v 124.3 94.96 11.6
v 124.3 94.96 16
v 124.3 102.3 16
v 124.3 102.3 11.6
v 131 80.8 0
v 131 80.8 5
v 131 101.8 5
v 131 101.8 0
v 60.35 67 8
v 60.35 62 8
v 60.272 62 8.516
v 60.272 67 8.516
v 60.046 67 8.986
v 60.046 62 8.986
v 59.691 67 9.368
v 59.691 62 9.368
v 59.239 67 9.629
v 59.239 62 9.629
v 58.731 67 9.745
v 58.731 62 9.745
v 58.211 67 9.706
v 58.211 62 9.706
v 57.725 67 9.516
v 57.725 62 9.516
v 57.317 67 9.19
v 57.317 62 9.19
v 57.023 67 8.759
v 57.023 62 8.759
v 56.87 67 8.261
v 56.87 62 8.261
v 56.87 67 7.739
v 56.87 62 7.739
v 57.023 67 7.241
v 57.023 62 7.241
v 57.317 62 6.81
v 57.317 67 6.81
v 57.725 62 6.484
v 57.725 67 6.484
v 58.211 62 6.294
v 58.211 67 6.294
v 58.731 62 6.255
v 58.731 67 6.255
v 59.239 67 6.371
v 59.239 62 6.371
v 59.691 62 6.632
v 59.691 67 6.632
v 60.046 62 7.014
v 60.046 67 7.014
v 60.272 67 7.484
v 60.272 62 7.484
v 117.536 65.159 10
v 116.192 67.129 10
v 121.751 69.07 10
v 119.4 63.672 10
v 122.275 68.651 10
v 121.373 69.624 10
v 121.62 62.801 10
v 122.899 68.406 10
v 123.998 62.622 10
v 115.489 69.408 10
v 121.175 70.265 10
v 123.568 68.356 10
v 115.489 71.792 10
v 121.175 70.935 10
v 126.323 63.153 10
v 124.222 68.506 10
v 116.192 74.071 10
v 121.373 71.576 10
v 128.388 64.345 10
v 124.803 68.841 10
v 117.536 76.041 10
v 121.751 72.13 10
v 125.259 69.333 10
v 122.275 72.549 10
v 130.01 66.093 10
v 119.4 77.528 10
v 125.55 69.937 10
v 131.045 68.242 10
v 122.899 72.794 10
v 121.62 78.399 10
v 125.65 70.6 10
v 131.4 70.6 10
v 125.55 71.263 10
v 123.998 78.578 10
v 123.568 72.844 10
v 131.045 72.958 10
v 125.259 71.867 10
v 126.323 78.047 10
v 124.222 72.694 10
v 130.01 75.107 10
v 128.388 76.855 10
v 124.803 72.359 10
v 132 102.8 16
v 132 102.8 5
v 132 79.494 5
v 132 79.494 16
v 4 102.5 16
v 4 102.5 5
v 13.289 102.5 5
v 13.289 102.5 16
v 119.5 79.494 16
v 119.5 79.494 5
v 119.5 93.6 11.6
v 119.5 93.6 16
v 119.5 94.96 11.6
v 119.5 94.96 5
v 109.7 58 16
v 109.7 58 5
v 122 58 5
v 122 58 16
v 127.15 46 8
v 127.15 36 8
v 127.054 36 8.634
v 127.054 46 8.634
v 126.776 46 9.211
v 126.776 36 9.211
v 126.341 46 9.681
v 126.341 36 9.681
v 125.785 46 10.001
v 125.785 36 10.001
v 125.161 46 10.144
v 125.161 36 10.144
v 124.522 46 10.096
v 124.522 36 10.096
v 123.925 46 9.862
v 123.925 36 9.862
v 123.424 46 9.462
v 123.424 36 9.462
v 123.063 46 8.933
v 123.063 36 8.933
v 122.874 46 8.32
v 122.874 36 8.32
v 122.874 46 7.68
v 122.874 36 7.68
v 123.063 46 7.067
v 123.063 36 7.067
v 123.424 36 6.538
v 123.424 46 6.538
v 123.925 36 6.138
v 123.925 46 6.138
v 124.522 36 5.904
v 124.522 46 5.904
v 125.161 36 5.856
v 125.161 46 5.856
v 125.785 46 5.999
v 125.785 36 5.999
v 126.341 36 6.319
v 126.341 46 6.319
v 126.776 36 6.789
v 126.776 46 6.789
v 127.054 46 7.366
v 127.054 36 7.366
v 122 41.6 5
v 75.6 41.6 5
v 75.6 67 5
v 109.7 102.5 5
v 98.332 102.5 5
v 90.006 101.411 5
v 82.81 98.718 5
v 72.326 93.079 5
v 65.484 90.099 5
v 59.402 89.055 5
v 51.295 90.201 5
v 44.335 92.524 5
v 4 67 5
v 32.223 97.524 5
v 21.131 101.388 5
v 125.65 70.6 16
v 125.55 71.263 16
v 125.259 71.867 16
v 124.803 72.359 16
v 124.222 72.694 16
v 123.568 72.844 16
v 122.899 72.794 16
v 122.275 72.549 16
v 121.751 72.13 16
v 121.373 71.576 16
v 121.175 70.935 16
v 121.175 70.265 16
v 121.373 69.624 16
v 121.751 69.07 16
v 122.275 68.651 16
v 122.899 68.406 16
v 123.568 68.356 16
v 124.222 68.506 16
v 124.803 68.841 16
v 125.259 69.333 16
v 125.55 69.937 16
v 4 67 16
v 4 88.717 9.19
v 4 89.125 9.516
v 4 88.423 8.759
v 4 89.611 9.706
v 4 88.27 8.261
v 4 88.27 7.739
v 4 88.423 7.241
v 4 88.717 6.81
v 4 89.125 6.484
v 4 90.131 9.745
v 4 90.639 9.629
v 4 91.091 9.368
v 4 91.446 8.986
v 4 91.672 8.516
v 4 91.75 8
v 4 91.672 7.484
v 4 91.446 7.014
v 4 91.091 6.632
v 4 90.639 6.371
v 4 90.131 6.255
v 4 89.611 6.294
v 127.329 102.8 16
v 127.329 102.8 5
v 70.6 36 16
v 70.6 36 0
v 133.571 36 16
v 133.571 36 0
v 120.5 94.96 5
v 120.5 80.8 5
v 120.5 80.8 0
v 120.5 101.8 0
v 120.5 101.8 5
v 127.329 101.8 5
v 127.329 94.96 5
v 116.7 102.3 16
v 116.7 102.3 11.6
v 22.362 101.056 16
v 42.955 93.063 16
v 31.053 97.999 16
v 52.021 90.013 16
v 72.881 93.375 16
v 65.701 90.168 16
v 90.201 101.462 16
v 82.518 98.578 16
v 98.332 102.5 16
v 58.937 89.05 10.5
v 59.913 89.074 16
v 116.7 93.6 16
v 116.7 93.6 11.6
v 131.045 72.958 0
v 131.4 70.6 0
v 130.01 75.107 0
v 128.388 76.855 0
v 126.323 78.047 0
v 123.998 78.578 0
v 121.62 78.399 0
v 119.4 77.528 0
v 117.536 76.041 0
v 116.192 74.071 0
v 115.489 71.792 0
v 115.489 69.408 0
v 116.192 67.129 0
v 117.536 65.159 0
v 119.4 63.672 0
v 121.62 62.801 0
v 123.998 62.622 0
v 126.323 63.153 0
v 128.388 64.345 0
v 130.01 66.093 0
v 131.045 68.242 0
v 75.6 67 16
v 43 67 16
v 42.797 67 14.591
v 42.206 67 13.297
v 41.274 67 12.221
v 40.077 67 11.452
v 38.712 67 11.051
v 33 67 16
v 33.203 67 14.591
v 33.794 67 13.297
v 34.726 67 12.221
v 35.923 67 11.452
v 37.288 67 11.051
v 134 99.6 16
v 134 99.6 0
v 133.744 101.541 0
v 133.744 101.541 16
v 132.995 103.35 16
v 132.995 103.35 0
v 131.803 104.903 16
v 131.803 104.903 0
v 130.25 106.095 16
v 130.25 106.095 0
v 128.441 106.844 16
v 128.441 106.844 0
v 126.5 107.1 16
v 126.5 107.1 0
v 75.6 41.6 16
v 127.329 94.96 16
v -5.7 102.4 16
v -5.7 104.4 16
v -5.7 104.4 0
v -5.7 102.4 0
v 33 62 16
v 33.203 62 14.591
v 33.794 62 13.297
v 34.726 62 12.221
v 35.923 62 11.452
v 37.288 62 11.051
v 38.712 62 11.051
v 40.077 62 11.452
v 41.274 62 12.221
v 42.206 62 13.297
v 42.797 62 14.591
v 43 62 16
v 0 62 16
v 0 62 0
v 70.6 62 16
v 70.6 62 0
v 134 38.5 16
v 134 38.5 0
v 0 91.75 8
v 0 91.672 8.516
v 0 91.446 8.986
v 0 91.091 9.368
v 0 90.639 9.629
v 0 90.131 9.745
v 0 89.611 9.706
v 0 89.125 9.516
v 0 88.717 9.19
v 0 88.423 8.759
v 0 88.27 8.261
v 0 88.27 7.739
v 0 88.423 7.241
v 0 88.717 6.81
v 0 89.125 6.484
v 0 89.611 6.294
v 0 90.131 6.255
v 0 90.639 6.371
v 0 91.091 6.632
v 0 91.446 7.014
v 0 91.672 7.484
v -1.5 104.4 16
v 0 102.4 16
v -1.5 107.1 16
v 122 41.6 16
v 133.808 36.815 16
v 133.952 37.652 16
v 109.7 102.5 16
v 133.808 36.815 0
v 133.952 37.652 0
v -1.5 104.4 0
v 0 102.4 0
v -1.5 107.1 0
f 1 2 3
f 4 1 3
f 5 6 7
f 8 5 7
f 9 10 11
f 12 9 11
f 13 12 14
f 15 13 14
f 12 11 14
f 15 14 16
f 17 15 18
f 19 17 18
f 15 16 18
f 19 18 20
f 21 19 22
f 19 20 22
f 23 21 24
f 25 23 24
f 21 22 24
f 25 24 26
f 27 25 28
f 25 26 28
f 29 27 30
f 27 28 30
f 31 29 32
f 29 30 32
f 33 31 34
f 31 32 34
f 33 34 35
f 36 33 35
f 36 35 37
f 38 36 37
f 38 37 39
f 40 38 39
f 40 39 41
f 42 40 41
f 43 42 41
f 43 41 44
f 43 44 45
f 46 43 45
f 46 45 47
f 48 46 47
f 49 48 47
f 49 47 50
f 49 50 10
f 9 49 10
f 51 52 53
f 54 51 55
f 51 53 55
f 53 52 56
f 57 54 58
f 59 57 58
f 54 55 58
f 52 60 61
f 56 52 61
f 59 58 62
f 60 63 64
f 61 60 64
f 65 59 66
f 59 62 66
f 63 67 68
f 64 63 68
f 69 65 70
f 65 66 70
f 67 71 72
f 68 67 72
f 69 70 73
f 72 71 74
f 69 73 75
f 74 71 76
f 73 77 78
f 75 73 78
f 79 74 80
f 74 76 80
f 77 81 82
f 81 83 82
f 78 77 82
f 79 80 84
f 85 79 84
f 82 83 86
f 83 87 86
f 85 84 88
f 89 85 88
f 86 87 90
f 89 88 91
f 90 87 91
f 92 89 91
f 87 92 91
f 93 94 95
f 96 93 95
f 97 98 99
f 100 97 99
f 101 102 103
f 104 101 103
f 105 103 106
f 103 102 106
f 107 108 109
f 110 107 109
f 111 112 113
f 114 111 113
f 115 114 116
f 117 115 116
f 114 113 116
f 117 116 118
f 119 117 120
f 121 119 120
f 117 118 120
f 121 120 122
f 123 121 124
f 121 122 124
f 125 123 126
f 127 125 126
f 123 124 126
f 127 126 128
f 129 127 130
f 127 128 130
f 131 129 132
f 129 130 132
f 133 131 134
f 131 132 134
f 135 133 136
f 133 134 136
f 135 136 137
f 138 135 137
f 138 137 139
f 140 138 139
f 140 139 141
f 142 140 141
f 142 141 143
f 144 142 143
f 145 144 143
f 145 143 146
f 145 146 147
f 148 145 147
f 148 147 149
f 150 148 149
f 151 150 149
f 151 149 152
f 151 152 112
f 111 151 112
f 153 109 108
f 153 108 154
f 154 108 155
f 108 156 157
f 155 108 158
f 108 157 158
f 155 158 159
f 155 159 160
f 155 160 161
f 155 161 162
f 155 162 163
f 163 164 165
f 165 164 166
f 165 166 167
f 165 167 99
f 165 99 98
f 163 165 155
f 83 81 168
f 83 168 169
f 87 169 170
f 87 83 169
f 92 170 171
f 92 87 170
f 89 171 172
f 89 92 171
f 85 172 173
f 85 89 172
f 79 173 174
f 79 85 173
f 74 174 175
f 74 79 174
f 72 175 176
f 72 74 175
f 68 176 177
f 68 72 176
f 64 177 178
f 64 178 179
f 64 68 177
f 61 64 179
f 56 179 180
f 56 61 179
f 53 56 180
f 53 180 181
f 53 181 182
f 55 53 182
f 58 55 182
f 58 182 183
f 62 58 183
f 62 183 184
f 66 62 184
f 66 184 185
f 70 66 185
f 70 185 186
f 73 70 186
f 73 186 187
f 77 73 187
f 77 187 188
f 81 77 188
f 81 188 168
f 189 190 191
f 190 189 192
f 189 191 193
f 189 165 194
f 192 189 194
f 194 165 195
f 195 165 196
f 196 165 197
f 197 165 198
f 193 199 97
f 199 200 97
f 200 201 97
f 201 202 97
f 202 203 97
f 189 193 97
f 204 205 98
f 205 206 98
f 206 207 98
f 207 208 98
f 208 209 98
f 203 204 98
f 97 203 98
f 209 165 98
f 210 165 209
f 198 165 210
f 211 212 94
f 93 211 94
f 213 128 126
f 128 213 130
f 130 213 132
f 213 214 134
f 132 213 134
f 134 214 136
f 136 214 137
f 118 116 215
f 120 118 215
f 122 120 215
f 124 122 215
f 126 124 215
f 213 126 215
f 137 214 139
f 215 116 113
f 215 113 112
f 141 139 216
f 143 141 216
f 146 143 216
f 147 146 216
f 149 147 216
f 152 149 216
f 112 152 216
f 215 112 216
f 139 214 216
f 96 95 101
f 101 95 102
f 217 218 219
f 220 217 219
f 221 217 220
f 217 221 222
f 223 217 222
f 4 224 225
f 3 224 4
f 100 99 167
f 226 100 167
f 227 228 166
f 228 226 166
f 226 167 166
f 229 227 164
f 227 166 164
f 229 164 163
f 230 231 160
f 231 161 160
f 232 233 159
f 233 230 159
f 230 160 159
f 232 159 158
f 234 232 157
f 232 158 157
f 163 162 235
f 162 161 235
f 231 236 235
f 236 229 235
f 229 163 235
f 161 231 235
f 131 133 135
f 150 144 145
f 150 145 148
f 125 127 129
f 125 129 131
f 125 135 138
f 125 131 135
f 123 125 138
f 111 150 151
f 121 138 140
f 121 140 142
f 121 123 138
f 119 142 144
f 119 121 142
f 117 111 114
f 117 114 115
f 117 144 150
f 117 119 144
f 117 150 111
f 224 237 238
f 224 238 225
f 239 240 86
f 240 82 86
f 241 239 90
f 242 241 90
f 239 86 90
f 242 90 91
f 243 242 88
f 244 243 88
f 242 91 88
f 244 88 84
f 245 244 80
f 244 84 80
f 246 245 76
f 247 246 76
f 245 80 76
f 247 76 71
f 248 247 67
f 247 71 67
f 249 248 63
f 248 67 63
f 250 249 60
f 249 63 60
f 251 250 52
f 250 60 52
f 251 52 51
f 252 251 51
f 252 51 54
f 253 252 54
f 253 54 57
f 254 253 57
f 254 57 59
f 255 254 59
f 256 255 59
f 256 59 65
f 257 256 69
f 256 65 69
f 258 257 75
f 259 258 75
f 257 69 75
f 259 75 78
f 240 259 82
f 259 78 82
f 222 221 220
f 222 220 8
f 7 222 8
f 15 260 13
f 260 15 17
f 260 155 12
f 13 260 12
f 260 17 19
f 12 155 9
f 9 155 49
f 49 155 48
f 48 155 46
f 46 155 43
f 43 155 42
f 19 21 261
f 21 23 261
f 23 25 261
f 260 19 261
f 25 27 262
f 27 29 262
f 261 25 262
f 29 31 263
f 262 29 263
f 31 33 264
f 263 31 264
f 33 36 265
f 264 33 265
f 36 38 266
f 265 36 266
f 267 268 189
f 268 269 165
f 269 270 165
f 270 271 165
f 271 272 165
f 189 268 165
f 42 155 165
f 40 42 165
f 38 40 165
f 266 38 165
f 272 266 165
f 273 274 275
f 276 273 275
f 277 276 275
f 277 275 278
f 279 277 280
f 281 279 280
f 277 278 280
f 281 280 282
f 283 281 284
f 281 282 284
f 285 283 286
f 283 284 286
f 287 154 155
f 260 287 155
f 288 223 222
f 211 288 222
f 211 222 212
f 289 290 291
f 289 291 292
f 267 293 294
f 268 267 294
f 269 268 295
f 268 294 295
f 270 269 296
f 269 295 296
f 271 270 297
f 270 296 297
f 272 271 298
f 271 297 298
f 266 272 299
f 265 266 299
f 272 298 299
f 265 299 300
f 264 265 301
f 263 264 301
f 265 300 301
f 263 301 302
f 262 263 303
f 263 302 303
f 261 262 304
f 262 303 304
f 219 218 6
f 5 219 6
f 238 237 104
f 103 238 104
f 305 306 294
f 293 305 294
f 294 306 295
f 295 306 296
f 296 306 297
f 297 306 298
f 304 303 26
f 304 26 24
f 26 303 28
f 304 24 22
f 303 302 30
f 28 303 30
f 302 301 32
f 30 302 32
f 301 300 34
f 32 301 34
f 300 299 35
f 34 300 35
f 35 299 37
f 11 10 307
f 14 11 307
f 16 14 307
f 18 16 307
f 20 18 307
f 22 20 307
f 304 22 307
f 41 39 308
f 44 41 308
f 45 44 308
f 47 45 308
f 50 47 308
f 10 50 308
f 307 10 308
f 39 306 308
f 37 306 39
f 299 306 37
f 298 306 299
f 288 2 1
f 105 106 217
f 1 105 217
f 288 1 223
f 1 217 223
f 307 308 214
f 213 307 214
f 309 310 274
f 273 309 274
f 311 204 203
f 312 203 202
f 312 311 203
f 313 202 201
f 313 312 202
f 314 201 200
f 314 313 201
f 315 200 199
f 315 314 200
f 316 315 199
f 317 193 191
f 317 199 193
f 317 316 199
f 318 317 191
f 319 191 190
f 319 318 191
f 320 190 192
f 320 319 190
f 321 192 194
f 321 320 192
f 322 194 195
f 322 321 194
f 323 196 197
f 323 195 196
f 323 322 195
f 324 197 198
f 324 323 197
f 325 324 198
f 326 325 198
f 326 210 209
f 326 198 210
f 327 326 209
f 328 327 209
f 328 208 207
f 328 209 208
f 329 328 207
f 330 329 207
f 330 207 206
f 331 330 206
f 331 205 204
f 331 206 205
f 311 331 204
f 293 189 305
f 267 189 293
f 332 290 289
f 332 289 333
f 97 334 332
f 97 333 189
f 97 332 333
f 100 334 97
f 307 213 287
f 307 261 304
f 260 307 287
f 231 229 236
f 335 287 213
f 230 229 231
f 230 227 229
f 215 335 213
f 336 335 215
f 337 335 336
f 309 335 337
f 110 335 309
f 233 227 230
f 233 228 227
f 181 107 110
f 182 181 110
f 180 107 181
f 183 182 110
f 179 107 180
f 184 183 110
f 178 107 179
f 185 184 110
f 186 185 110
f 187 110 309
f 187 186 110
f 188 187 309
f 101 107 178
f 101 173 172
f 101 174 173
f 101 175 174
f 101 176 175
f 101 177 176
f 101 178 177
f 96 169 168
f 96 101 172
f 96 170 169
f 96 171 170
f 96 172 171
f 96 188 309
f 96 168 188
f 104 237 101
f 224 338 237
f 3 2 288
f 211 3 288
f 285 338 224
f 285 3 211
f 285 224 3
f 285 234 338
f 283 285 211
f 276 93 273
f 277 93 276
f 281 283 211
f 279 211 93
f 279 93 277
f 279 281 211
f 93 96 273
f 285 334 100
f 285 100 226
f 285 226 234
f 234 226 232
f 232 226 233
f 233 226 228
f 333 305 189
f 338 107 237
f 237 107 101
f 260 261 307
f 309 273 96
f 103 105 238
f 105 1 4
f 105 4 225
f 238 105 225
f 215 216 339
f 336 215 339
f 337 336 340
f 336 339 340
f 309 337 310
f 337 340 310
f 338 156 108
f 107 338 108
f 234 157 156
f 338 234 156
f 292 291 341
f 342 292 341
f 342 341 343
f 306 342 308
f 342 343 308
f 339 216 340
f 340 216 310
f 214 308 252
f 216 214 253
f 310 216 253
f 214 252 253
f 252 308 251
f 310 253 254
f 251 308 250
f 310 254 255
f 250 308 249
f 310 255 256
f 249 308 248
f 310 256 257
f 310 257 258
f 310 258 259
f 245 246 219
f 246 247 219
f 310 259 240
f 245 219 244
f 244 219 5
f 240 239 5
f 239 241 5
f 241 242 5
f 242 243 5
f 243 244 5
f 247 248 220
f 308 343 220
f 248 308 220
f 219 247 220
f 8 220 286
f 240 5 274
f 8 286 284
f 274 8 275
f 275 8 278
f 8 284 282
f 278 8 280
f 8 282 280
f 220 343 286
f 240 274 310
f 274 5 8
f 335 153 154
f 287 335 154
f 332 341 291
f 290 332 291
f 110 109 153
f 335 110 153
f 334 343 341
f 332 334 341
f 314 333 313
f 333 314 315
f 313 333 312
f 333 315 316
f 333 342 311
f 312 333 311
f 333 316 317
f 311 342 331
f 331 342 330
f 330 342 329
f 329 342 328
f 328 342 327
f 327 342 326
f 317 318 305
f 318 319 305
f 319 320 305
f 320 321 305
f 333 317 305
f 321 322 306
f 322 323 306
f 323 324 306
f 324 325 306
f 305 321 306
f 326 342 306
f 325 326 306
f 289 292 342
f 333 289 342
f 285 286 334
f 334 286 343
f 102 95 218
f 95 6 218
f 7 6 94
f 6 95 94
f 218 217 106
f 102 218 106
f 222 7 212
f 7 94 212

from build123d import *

# Parameters (mm, degrees)
SKETCH_R        = 2.25
PAD_DEPTH       = 16
POCKET_DEPTH    = 21
SKETCH002_R     = 1.75
POCKET001_DEPTH = 23
SKETCH003_R     = 1.75
SKETCH003_R_2   = 2.15
POCKET002_DEPTH = 46
SKETCH005_R     = 8
POCKET004_DEPTH = 5
POCKET005_DEPTH = 4.4
SKETCH007_W     = 10.5
SKETCH007_H     = 21
POCKET006_DEPTH = 6
POCKET007_DEPTH = 18
SKETCH009_R     = 1.75
POCKET008_DEPTH = 86


with BuildPart() as part:
    # Sketch → Pad (new body)
    with BuildSketch(Plane.XY):
        with BuildLine():
            Line((126.5, 107.1), (-1.5, 107.1))
            Line((-1.5, 107.1), (-1.5, 104.4))
            Line((-1.5, 104.4), (-5.7, 104.4))
            Line((-5.7, 104.4), (-5.7, 102.4))
            Line((-5.7, 102.4), (0, 102.4))
            Line((0, 102.4), (0, 62))
            Line((0, 62), (70.6, 62))
            Line((70.6, 62), (70.6, 36))
            Line((70.6, 36), (75.6, 36))
            Line((75.6, 36), (133.571068, 36))
            ThreePointArc((133.571068, 36), (133.891989, 37.231735), (134, 38.5))
            Line((134, 38.5), (134, 99.6))
            ThreePointArc((134, 99.6), (131.803301, 104.903301), (126.5, 107.1))
        make_face()
        with Locations((123.4, 70.6)):
            Circle(SKETCH_R, mode=Mode.SUBTRACT)
    extrude(amount=PAD_DEPTH)

    # Sketch001 (on DatumPlane) → Pocket (cut)
    with BuildSketch(Plane.XY.offset(5)):
        Polygon((128.6, 101.8), (131, 101.8), (131, 79.9), (120.7, 79.9), (120.7, 93.6), (120.7, 93.9), (124.3, 93.9), (128.6, 93.9), align=None)
        with BuildLine():
            add(Edge.make_bspline(
                [(13.289069, 102.5), (27.487875, 102.5), (63.575842, 75.600151), (81.110251, 102.5), (98.331885, 102.5)],
                knots=[0, 0, 0, 0, 0.5, 1, 1, 1, 1], degree=3))
            Line((98.331885, 102.5), (109.7, 102.5))
            Line((109.7, 102.5), (109.7, 58))
            Line((109.7, 58), (122, 58))
            Line((122, 58), (122, 41.6))
            Line((122, 41.6), (80, 41.6))
            Line((80, 41.6), (75.6, 41.6))
            Line((75.6, 41.6), (75.6, 67))
            Line((75.6, 67), (4, 67))
            Line((4, 67), (4, 102.5))
            Line((4, 102.5), (13.289069, 102.5))
        make_face()
    extrude(amount=POCKET_DEPTH, mode=Mode.SUBTRACT)

    # Sketch002 → Pocket001 (cut)
    with BuildSketch(Plane.YZ):
        with Locations((12, 8)):
            Circle(SKETCH002_R)
        with Locations((60, 8)):
            Circle(SKETCH002_R)
        with Locations((90, 8)):
            Circle(SKETCH002_R)
    extrude(amount=POCKET001_DEPTH, mode=Mode.SUBTRACT)

    # Sketch003 → Pocket002 (cut)
    with BuildSketch(Plane.XZ):
        with Locations((58.6, 8)):
            Circle(SKETCH003_R)
        with Locations((8, 8)):
            Circle(SKETCH003_R)
        with Locations((125, 8)):
            Circle(SKETCH003_R_2)
    extrude(amount=-POCKET002_DEPTH, mode=Mode.SUBTRACT)

    # Sketch005 (on DatumPlane) → Pocket004 (cut, symmetric)
    with BuildSketch(Plane.XY.offset(5)):
        with Locations((123.4, 70.6)):
            Circle(SKETCH005_R)
    extrude(amount=POCKET004_DEPTH, both=True, mode=Mode.SUBTRACT)

    # Sketch006 (on DatumPlane) → Pocket005 (cut)
    with BuildSketch(Plane.XY.offset(16)):
        Polygon((116.7, 102.3), (124.3, 102.3), (124.3, 93.9), (124.3, 93.6), (120.7, 93.6), (116.7, 93.6), align=None)
    extrude(amount=-POCKET005_DEPTH, mode=Mode.SUBTRACT)

    # Sketch007 (on DatumPlane) → Pocket006 (cut)
    with BuildSketch(Plane.XY.offset(5)):
        with Locations((125.75, 91.3)):
            Rectangle(SKETCH007_W, SKETCH007_H)
    extrude(amount=-POCKET006_DEPTH, mode=Mode.SUBTRACT)

    # Sketch008 (on DatumPlane) → Pocket007 (cut)
    with BuildSketch(Plane.XY.offset(5)):
        Polygon((127.328613, 102.8), (132, 102.8), (132, 79.494476), (119.5, 79.494476), (119.5, 94.960373), (127.328613, 94.960373), align=None)
    extrude(amount=POCKET007_DEPTH, mode=Mode.SUBTRACT)

    # Sketch009 → Pocket008 (cut)
    with BuildSketch(Plane.XZ):
        with Locations((58.6, 8)):
            Circle(SKETCH009_R)
        with BuildLine():
            ThreePointArc((33, 16), (38, 11), (43, 16))
            Line((43, 16), (43, 31.673506))
            ThreePointArc((43, 31.673506), (38, 36.673506), (33, 31.673506))
            Line((33, 31.673506), (33, 16))
        make_face()
    extrude(amount=-POCKET008_DEPTH, mode=Mode.SUBTRACT)


solid = part.part
